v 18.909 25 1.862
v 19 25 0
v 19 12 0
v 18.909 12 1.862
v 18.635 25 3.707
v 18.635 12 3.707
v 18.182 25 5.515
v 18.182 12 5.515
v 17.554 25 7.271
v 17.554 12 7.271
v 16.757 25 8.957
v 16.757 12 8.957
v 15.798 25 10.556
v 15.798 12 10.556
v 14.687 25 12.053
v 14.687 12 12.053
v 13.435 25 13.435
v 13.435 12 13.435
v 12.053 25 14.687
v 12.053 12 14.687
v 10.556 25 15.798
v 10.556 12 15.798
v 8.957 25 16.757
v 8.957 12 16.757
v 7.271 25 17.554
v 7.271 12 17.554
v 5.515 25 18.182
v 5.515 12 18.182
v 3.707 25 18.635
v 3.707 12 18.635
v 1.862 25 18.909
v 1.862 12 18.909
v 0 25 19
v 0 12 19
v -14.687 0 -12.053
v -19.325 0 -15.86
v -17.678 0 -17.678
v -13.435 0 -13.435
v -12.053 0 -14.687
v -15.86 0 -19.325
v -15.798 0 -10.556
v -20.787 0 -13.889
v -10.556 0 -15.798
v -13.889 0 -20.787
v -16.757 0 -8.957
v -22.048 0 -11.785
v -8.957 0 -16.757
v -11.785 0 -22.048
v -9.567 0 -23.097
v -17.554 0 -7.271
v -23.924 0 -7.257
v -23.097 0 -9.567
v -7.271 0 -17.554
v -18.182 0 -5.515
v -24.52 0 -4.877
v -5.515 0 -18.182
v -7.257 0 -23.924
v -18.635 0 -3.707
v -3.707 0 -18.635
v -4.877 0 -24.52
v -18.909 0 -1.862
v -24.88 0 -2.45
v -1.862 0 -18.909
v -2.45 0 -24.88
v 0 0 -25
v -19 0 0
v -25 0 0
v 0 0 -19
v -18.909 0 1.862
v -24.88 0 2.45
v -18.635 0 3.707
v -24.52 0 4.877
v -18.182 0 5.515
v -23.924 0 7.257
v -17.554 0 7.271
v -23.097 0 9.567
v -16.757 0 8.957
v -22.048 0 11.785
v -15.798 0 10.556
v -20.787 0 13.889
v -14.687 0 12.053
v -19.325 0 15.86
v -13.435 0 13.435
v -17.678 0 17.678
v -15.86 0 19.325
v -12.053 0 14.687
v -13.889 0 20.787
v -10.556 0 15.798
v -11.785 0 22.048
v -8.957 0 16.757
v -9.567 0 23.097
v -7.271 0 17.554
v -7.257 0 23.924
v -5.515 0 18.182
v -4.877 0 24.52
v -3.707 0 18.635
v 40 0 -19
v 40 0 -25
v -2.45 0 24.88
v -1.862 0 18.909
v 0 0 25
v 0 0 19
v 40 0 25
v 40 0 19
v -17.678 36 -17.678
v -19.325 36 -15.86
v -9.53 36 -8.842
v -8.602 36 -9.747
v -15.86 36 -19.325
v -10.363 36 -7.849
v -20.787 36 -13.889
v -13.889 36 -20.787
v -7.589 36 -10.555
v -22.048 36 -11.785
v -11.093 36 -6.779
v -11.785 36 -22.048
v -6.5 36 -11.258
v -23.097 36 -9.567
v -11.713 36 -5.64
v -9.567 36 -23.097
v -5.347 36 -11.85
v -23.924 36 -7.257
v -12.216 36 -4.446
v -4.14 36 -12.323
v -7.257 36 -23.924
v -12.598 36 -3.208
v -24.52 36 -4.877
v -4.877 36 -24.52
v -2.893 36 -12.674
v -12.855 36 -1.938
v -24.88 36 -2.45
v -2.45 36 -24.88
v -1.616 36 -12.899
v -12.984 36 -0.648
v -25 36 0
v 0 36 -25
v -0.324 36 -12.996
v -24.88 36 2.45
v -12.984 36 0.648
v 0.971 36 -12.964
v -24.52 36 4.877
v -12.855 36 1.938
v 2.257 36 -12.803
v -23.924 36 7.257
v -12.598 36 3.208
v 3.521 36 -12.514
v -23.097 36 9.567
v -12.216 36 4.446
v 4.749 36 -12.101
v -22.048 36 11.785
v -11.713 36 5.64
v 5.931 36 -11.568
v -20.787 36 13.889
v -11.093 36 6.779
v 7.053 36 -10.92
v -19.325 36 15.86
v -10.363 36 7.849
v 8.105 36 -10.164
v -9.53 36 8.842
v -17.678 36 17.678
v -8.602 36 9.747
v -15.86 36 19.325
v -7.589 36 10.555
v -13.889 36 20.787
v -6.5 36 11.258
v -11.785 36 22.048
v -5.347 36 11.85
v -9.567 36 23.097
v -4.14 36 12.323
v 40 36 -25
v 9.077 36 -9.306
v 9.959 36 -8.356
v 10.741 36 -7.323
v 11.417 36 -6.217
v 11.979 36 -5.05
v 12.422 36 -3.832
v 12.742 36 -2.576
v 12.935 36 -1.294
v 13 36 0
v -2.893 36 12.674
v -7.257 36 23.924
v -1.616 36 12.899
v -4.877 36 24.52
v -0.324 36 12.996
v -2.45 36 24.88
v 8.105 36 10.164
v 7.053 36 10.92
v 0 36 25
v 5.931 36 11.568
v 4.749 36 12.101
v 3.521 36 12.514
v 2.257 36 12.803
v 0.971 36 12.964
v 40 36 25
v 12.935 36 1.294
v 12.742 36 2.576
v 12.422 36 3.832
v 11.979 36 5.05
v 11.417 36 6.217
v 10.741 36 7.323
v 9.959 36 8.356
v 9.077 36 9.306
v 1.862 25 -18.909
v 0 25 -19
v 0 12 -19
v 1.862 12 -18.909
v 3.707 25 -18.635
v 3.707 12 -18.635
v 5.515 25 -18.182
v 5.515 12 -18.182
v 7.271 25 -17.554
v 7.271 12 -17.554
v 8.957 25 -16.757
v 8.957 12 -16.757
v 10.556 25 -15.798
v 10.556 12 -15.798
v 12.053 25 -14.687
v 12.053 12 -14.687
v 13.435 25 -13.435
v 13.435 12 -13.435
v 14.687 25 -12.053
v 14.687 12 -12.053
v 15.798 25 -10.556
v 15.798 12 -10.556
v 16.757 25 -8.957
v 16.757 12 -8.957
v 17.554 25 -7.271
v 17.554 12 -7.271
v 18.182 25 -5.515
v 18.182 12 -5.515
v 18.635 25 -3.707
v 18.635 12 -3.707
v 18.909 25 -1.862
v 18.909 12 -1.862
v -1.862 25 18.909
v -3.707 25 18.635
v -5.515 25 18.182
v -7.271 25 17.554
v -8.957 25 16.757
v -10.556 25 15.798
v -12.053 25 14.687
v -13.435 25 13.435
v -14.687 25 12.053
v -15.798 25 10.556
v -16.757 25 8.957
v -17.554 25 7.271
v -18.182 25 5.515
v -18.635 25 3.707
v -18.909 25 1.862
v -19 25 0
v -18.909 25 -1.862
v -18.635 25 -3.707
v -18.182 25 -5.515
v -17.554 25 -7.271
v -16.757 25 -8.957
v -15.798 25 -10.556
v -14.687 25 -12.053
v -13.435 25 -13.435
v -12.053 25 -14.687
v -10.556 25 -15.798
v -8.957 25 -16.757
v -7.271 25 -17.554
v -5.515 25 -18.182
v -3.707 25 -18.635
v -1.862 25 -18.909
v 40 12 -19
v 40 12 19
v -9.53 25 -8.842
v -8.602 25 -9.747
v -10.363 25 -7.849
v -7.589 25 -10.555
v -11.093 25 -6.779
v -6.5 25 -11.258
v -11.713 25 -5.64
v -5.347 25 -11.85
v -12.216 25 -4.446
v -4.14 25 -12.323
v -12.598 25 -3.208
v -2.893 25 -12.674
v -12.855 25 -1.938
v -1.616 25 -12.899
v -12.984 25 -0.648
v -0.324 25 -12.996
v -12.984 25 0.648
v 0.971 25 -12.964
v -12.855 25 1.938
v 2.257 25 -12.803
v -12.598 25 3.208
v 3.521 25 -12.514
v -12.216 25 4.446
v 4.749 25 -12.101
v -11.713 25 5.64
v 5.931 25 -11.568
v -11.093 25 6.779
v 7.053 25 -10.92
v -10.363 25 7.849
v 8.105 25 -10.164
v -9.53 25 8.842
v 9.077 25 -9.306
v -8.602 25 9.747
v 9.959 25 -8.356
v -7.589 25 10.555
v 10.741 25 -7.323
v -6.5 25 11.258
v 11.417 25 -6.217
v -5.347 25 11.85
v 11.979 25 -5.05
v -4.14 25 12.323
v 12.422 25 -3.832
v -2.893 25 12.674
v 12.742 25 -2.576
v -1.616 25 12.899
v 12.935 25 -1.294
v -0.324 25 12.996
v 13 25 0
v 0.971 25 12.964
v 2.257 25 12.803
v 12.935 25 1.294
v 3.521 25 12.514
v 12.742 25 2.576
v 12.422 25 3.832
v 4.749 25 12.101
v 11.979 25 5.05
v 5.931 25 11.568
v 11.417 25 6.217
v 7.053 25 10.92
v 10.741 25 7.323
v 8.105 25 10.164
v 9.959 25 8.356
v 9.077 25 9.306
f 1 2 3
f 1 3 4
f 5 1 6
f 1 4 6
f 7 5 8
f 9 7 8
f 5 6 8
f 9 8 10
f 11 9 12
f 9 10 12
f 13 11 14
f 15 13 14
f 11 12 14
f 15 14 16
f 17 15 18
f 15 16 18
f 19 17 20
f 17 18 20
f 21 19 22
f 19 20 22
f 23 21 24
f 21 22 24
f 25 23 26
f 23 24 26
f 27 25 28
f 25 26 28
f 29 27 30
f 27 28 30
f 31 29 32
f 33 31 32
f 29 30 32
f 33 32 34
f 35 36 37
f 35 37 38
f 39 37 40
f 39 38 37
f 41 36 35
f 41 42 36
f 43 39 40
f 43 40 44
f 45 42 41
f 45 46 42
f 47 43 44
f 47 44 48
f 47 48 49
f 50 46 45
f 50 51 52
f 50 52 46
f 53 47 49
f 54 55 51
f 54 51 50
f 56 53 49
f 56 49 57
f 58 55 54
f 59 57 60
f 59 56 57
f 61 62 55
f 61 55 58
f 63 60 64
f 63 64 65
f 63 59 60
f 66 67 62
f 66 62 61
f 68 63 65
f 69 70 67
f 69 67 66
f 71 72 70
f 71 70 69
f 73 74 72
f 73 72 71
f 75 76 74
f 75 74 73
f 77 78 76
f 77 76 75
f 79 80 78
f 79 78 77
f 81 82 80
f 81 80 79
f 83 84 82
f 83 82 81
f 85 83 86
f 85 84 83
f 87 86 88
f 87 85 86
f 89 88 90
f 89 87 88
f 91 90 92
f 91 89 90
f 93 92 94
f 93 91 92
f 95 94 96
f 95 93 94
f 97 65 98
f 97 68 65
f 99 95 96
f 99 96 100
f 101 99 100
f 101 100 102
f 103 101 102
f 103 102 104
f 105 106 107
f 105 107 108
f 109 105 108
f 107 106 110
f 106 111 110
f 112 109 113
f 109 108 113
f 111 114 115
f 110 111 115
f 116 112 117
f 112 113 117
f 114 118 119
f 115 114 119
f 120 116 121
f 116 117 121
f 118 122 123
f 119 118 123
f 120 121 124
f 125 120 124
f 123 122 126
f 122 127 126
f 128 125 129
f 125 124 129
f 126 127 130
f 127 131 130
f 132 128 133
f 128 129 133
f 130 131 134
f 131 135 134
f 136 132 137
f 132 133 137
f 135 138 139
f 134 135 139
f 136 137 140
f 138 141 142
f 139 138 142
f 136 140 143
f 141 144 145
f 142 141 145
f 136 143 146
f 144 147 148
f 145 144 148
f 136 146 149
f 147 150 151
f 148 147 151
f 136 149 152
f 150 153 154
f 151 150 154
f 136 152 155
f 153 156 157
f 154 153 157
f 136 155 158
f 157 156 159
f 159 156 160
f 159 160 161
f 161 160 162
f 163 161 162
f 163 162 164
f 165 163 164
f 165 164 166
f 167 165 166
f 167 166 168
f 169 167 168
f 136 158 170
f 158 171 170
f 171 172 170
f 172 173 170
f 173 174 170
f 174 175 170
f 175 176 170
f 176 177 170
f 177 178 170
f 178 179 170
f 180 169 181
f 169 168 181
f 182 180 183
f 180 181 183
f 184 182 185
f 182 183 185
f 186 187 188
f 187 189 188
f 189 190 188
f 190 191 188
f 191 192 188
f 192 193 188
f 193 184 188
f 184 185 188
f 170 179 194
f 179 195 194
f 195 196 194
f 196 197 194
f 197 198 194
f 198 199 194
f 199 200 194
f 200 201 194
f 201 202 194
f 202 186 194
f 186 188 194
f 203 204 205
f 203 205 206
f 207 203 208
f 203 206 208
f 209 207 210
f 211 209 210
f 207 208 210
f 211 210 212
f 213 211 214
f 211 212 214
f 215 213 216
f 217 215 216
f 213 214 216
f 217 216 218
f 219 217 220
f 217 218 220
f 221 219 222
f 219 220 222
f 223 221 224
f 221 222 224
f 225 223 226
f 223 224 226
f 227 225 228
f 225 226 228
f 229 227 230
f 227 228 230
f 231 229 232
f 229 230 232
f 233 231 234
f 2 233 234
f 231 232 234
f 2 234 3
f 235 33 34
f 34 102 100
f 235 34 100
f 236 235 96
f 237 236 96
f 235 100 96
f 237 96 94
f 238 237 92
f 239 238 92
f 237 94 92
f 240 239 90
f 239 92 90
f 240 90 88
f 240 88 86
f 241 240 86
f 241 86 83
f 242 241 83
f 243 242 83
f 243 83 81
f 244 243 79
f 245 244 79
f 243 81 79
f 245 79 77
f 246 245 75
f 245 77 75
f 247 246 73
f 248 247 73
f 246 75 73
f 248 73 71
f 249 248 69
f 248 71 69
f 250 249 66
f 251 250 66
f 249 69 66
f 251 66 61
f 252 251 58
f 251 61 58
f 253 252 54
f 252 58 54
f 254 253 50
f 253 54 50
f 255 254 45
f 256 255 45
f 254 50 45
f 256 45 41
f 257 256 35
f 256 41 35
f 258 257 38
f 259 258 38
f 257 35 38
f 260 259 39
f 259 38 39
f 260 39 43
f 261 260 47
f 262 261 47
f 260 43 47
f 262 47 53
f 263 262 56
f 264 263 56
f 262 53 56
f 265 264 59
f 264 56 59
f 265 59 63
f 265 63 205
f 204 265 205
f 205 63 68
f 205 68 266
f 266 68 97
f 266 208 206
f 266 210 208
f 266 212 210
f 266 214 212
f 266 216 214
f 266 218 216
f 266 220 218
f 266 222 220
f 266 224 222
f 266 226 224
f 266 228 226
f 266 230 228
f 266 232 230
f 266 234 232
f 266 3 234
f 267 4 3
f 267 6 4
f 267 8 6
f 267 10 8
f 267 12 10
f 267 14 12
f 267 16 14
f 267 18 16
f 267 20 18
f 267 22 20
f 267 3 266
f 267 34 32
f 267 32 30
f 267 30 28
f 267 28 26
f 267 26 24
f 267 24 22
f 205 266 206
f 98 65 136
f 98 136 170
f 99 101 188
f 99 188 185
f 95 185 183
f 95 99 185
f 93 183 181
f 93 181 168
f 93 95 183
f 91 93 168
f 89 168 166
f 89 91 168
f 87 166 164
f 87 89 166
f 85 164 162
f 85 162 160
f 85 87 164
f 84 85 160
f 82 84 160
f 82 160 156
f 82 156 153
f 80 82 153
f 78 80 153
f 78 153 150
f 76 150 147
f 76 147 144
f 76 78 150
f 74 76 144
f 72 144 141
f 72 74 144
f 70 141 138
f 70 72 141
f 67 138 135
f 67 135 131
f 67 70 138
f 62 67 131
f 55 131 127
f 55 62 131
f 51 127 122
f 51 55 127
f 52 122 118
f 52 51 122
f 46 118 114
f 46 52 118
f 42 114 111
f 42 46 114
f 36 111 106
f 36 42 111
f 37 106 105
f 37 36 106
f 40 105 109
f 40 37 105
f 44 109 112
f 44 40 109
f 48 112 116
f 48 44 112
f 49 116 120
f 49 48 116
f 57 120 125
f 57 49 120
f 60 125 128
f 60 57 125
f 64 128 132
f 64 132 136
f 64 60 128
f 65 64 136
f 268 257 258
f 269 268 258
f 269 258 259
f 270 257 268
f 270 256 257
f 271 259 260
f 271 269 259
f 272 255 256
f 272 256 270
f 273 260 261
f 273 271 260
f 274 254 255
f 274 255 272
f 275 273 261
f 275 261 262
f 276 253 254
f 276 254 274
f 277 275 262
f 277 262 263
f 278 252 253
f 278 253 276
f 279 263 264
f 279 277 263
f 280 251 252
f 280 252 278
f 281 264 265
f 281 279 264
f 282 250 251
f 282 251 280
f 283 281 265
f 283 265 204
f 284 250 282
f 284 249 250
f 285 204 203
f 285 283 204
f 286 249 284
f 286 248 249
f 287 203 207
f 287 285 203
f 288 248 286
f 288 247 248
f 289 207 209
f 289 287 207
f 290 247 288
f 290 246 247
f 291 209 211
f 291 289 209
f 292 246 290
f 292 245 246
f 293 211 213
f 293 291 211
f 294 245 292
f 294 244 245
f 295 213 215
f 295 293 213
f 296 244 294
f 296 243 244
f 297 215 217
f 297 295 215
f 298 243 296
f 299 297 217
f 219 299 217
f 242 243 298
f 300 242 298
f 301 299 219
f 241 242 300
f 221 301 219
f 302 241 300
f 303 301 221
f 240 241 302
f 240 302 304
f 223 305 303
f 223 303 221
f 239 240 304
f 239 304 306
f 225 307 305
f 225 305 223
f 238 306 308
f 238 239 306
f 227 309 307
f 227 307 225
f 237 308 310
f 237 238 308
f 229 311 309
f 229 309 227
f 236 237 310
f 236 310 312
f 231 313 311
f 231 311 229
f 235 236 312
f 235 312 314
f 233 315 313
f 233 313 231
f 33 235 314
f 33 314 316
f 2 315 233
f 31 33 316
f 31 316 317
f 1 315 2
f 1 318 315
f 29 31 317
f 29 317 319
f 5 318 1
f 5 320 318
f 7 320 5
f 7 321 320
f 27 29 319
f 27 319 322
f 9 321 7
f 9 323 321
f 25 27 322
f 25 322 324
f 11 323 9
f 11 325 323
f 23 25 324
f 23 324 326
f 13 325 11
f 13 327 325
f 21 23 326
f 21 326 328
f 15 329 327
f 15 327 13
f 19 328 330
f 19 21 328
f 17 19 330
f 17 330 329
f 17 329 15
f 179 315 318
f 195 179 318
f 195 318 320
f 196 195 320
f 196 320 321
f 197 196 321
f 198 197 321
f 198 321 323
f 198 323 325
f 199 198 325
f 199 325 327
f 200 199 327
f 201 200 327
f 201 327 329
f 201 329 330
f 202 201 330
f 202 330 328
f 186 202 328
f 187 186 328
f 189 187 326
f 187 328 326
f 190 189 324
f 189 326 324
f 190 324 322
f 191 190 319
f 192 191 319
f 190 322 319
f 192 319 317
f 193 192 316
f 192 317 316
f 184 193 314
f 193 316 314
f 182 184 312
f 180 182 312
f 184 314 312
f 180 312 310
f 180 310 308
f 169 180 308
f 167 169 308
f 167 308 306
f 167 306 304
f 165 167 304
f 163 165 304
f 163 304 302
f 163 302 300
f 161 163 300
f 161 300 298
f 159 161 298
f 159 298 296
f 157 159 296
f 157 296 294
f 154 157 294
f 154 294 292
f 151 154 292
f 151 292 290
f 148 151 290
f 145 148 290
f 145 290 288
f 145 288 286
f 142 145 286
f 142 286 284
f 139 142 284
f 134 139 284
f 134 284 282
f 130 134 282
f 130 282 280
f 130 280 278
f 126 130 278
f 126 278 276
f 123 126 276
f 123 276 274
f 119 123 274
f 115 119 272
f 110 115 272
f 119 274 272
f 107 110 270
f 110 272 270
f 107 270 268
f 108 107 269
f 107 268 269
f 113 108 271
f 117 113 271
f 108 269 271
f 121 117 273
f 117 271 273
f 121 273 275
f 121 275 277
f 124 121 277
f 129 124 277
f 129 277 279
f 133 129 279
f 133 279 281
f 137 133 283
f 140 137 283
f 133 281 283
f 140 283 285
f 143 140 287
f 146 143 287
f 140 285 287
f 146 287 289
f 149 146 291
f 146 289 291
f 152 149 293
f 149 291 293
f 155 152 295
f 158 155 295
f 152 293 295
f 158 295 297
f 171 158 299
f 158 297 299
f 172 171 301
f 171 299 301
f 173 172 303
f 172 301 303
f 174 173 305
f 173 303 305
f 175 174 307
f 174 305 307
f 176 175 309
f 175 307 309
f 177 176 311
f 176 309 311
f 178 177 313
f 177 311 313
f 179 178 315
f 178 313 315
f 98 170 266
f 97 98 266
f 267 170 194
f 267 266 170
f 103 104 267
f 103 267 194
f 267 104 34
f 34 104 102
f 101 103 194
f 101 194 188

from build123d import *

# Parameters (mm, degrees)
F0_R     = 13
F1_DEPTH = 36
F2_DEPTH = 12
F3_DEPTH = 25


with BuildPart() as f1:
    # F0 (on Front) → F1 (new body)
    with BuildSketch(Plane.XZ):
        with BuildLine():
            ThreePointArc((0, 19), (13.435029, 13.435029), (19, 0))
            ThreePointArc((19, 0), (13.435029, -13.435029), (0, -19))
            Line((0, -19), (40, -19))
            Line((40, -19), (40, 19))
            Line((40, 19), (0, 19))
        make_face()
        with BuildLine():
            ThreePointArc((0, -19), (-19, 0), (0, 19))
            Line((0, 19), (40, 19))
            Line((40, 19), (40, 25))
            Line((40, 25), (0, 25))
            ThreePointArc((0, 25), (-25, 0), (0, -25))
            Line((0, -25), (40, -25))
            Line((40, -25), (40, -19))
            Line((40, -19), (0, -19))
        make_face()
        with BuildLine():
            ThreePointArc((0, -19), (13.435029, -13.435029), (19, 0))
            ThreePointArc((19, 0), (13.435029, 13.435029), (0, 19))
            ThreePointArc((0, 19), (-19, 0), (0, -19))
        make_face()
        Circle(F0_R, mode=Mode.SUBTRACT)
    extrude(amount=-F1_DEPTH)

    # F0 (on Front) → F2 (cut)
    with BuildSketch(Plane.XZ):
        with BuildLine():
            ThreePointArc((0, -19), (13.435029, -13.435029), (19, 0))
            ThreePointArc((19, 0), (13.435029, 13.435029), (0, 19))
            ThreePointArc((0, 19), (-19, 0), (0, -19))
        make_face()
        Circle(F0_R, mode=Mode.SUBTRACT)
        with BuildLine():
            ThreePointArc((0, 19), (13.435029, 13.435029), (19, 0))
            ThreePointArc((19, 0), (13.435029, -13.435029), (0, -19))
            Line((0, -19), (40, -19))
            Line((40, -19), (40, 19))
            Line((40, 19), (0, 19))
        make_face()
    extrude(amount=-F2_DEPTH, mode=Mode.SUBTRACT)

    # F0 (on Front) → F3 (cut)
    with BuildSketch(Plane.XZ):
        with BuildLine():
            ThreePointArc((0, -19), (13.435029, -13.435029), (19, 0))
            ThreePointArc((19, 0), (13.435029, 13.435029), (0, 19))
            ThreePointArc((0, 19), (-19, 0), (0, -19))
        make_face()
        Circle(F0_R, mode=Mode.SUBTRACT)
    extrude(amount=-F3_DEPTH, mode=Mode.SUBTRACT)


solid = f1.part
